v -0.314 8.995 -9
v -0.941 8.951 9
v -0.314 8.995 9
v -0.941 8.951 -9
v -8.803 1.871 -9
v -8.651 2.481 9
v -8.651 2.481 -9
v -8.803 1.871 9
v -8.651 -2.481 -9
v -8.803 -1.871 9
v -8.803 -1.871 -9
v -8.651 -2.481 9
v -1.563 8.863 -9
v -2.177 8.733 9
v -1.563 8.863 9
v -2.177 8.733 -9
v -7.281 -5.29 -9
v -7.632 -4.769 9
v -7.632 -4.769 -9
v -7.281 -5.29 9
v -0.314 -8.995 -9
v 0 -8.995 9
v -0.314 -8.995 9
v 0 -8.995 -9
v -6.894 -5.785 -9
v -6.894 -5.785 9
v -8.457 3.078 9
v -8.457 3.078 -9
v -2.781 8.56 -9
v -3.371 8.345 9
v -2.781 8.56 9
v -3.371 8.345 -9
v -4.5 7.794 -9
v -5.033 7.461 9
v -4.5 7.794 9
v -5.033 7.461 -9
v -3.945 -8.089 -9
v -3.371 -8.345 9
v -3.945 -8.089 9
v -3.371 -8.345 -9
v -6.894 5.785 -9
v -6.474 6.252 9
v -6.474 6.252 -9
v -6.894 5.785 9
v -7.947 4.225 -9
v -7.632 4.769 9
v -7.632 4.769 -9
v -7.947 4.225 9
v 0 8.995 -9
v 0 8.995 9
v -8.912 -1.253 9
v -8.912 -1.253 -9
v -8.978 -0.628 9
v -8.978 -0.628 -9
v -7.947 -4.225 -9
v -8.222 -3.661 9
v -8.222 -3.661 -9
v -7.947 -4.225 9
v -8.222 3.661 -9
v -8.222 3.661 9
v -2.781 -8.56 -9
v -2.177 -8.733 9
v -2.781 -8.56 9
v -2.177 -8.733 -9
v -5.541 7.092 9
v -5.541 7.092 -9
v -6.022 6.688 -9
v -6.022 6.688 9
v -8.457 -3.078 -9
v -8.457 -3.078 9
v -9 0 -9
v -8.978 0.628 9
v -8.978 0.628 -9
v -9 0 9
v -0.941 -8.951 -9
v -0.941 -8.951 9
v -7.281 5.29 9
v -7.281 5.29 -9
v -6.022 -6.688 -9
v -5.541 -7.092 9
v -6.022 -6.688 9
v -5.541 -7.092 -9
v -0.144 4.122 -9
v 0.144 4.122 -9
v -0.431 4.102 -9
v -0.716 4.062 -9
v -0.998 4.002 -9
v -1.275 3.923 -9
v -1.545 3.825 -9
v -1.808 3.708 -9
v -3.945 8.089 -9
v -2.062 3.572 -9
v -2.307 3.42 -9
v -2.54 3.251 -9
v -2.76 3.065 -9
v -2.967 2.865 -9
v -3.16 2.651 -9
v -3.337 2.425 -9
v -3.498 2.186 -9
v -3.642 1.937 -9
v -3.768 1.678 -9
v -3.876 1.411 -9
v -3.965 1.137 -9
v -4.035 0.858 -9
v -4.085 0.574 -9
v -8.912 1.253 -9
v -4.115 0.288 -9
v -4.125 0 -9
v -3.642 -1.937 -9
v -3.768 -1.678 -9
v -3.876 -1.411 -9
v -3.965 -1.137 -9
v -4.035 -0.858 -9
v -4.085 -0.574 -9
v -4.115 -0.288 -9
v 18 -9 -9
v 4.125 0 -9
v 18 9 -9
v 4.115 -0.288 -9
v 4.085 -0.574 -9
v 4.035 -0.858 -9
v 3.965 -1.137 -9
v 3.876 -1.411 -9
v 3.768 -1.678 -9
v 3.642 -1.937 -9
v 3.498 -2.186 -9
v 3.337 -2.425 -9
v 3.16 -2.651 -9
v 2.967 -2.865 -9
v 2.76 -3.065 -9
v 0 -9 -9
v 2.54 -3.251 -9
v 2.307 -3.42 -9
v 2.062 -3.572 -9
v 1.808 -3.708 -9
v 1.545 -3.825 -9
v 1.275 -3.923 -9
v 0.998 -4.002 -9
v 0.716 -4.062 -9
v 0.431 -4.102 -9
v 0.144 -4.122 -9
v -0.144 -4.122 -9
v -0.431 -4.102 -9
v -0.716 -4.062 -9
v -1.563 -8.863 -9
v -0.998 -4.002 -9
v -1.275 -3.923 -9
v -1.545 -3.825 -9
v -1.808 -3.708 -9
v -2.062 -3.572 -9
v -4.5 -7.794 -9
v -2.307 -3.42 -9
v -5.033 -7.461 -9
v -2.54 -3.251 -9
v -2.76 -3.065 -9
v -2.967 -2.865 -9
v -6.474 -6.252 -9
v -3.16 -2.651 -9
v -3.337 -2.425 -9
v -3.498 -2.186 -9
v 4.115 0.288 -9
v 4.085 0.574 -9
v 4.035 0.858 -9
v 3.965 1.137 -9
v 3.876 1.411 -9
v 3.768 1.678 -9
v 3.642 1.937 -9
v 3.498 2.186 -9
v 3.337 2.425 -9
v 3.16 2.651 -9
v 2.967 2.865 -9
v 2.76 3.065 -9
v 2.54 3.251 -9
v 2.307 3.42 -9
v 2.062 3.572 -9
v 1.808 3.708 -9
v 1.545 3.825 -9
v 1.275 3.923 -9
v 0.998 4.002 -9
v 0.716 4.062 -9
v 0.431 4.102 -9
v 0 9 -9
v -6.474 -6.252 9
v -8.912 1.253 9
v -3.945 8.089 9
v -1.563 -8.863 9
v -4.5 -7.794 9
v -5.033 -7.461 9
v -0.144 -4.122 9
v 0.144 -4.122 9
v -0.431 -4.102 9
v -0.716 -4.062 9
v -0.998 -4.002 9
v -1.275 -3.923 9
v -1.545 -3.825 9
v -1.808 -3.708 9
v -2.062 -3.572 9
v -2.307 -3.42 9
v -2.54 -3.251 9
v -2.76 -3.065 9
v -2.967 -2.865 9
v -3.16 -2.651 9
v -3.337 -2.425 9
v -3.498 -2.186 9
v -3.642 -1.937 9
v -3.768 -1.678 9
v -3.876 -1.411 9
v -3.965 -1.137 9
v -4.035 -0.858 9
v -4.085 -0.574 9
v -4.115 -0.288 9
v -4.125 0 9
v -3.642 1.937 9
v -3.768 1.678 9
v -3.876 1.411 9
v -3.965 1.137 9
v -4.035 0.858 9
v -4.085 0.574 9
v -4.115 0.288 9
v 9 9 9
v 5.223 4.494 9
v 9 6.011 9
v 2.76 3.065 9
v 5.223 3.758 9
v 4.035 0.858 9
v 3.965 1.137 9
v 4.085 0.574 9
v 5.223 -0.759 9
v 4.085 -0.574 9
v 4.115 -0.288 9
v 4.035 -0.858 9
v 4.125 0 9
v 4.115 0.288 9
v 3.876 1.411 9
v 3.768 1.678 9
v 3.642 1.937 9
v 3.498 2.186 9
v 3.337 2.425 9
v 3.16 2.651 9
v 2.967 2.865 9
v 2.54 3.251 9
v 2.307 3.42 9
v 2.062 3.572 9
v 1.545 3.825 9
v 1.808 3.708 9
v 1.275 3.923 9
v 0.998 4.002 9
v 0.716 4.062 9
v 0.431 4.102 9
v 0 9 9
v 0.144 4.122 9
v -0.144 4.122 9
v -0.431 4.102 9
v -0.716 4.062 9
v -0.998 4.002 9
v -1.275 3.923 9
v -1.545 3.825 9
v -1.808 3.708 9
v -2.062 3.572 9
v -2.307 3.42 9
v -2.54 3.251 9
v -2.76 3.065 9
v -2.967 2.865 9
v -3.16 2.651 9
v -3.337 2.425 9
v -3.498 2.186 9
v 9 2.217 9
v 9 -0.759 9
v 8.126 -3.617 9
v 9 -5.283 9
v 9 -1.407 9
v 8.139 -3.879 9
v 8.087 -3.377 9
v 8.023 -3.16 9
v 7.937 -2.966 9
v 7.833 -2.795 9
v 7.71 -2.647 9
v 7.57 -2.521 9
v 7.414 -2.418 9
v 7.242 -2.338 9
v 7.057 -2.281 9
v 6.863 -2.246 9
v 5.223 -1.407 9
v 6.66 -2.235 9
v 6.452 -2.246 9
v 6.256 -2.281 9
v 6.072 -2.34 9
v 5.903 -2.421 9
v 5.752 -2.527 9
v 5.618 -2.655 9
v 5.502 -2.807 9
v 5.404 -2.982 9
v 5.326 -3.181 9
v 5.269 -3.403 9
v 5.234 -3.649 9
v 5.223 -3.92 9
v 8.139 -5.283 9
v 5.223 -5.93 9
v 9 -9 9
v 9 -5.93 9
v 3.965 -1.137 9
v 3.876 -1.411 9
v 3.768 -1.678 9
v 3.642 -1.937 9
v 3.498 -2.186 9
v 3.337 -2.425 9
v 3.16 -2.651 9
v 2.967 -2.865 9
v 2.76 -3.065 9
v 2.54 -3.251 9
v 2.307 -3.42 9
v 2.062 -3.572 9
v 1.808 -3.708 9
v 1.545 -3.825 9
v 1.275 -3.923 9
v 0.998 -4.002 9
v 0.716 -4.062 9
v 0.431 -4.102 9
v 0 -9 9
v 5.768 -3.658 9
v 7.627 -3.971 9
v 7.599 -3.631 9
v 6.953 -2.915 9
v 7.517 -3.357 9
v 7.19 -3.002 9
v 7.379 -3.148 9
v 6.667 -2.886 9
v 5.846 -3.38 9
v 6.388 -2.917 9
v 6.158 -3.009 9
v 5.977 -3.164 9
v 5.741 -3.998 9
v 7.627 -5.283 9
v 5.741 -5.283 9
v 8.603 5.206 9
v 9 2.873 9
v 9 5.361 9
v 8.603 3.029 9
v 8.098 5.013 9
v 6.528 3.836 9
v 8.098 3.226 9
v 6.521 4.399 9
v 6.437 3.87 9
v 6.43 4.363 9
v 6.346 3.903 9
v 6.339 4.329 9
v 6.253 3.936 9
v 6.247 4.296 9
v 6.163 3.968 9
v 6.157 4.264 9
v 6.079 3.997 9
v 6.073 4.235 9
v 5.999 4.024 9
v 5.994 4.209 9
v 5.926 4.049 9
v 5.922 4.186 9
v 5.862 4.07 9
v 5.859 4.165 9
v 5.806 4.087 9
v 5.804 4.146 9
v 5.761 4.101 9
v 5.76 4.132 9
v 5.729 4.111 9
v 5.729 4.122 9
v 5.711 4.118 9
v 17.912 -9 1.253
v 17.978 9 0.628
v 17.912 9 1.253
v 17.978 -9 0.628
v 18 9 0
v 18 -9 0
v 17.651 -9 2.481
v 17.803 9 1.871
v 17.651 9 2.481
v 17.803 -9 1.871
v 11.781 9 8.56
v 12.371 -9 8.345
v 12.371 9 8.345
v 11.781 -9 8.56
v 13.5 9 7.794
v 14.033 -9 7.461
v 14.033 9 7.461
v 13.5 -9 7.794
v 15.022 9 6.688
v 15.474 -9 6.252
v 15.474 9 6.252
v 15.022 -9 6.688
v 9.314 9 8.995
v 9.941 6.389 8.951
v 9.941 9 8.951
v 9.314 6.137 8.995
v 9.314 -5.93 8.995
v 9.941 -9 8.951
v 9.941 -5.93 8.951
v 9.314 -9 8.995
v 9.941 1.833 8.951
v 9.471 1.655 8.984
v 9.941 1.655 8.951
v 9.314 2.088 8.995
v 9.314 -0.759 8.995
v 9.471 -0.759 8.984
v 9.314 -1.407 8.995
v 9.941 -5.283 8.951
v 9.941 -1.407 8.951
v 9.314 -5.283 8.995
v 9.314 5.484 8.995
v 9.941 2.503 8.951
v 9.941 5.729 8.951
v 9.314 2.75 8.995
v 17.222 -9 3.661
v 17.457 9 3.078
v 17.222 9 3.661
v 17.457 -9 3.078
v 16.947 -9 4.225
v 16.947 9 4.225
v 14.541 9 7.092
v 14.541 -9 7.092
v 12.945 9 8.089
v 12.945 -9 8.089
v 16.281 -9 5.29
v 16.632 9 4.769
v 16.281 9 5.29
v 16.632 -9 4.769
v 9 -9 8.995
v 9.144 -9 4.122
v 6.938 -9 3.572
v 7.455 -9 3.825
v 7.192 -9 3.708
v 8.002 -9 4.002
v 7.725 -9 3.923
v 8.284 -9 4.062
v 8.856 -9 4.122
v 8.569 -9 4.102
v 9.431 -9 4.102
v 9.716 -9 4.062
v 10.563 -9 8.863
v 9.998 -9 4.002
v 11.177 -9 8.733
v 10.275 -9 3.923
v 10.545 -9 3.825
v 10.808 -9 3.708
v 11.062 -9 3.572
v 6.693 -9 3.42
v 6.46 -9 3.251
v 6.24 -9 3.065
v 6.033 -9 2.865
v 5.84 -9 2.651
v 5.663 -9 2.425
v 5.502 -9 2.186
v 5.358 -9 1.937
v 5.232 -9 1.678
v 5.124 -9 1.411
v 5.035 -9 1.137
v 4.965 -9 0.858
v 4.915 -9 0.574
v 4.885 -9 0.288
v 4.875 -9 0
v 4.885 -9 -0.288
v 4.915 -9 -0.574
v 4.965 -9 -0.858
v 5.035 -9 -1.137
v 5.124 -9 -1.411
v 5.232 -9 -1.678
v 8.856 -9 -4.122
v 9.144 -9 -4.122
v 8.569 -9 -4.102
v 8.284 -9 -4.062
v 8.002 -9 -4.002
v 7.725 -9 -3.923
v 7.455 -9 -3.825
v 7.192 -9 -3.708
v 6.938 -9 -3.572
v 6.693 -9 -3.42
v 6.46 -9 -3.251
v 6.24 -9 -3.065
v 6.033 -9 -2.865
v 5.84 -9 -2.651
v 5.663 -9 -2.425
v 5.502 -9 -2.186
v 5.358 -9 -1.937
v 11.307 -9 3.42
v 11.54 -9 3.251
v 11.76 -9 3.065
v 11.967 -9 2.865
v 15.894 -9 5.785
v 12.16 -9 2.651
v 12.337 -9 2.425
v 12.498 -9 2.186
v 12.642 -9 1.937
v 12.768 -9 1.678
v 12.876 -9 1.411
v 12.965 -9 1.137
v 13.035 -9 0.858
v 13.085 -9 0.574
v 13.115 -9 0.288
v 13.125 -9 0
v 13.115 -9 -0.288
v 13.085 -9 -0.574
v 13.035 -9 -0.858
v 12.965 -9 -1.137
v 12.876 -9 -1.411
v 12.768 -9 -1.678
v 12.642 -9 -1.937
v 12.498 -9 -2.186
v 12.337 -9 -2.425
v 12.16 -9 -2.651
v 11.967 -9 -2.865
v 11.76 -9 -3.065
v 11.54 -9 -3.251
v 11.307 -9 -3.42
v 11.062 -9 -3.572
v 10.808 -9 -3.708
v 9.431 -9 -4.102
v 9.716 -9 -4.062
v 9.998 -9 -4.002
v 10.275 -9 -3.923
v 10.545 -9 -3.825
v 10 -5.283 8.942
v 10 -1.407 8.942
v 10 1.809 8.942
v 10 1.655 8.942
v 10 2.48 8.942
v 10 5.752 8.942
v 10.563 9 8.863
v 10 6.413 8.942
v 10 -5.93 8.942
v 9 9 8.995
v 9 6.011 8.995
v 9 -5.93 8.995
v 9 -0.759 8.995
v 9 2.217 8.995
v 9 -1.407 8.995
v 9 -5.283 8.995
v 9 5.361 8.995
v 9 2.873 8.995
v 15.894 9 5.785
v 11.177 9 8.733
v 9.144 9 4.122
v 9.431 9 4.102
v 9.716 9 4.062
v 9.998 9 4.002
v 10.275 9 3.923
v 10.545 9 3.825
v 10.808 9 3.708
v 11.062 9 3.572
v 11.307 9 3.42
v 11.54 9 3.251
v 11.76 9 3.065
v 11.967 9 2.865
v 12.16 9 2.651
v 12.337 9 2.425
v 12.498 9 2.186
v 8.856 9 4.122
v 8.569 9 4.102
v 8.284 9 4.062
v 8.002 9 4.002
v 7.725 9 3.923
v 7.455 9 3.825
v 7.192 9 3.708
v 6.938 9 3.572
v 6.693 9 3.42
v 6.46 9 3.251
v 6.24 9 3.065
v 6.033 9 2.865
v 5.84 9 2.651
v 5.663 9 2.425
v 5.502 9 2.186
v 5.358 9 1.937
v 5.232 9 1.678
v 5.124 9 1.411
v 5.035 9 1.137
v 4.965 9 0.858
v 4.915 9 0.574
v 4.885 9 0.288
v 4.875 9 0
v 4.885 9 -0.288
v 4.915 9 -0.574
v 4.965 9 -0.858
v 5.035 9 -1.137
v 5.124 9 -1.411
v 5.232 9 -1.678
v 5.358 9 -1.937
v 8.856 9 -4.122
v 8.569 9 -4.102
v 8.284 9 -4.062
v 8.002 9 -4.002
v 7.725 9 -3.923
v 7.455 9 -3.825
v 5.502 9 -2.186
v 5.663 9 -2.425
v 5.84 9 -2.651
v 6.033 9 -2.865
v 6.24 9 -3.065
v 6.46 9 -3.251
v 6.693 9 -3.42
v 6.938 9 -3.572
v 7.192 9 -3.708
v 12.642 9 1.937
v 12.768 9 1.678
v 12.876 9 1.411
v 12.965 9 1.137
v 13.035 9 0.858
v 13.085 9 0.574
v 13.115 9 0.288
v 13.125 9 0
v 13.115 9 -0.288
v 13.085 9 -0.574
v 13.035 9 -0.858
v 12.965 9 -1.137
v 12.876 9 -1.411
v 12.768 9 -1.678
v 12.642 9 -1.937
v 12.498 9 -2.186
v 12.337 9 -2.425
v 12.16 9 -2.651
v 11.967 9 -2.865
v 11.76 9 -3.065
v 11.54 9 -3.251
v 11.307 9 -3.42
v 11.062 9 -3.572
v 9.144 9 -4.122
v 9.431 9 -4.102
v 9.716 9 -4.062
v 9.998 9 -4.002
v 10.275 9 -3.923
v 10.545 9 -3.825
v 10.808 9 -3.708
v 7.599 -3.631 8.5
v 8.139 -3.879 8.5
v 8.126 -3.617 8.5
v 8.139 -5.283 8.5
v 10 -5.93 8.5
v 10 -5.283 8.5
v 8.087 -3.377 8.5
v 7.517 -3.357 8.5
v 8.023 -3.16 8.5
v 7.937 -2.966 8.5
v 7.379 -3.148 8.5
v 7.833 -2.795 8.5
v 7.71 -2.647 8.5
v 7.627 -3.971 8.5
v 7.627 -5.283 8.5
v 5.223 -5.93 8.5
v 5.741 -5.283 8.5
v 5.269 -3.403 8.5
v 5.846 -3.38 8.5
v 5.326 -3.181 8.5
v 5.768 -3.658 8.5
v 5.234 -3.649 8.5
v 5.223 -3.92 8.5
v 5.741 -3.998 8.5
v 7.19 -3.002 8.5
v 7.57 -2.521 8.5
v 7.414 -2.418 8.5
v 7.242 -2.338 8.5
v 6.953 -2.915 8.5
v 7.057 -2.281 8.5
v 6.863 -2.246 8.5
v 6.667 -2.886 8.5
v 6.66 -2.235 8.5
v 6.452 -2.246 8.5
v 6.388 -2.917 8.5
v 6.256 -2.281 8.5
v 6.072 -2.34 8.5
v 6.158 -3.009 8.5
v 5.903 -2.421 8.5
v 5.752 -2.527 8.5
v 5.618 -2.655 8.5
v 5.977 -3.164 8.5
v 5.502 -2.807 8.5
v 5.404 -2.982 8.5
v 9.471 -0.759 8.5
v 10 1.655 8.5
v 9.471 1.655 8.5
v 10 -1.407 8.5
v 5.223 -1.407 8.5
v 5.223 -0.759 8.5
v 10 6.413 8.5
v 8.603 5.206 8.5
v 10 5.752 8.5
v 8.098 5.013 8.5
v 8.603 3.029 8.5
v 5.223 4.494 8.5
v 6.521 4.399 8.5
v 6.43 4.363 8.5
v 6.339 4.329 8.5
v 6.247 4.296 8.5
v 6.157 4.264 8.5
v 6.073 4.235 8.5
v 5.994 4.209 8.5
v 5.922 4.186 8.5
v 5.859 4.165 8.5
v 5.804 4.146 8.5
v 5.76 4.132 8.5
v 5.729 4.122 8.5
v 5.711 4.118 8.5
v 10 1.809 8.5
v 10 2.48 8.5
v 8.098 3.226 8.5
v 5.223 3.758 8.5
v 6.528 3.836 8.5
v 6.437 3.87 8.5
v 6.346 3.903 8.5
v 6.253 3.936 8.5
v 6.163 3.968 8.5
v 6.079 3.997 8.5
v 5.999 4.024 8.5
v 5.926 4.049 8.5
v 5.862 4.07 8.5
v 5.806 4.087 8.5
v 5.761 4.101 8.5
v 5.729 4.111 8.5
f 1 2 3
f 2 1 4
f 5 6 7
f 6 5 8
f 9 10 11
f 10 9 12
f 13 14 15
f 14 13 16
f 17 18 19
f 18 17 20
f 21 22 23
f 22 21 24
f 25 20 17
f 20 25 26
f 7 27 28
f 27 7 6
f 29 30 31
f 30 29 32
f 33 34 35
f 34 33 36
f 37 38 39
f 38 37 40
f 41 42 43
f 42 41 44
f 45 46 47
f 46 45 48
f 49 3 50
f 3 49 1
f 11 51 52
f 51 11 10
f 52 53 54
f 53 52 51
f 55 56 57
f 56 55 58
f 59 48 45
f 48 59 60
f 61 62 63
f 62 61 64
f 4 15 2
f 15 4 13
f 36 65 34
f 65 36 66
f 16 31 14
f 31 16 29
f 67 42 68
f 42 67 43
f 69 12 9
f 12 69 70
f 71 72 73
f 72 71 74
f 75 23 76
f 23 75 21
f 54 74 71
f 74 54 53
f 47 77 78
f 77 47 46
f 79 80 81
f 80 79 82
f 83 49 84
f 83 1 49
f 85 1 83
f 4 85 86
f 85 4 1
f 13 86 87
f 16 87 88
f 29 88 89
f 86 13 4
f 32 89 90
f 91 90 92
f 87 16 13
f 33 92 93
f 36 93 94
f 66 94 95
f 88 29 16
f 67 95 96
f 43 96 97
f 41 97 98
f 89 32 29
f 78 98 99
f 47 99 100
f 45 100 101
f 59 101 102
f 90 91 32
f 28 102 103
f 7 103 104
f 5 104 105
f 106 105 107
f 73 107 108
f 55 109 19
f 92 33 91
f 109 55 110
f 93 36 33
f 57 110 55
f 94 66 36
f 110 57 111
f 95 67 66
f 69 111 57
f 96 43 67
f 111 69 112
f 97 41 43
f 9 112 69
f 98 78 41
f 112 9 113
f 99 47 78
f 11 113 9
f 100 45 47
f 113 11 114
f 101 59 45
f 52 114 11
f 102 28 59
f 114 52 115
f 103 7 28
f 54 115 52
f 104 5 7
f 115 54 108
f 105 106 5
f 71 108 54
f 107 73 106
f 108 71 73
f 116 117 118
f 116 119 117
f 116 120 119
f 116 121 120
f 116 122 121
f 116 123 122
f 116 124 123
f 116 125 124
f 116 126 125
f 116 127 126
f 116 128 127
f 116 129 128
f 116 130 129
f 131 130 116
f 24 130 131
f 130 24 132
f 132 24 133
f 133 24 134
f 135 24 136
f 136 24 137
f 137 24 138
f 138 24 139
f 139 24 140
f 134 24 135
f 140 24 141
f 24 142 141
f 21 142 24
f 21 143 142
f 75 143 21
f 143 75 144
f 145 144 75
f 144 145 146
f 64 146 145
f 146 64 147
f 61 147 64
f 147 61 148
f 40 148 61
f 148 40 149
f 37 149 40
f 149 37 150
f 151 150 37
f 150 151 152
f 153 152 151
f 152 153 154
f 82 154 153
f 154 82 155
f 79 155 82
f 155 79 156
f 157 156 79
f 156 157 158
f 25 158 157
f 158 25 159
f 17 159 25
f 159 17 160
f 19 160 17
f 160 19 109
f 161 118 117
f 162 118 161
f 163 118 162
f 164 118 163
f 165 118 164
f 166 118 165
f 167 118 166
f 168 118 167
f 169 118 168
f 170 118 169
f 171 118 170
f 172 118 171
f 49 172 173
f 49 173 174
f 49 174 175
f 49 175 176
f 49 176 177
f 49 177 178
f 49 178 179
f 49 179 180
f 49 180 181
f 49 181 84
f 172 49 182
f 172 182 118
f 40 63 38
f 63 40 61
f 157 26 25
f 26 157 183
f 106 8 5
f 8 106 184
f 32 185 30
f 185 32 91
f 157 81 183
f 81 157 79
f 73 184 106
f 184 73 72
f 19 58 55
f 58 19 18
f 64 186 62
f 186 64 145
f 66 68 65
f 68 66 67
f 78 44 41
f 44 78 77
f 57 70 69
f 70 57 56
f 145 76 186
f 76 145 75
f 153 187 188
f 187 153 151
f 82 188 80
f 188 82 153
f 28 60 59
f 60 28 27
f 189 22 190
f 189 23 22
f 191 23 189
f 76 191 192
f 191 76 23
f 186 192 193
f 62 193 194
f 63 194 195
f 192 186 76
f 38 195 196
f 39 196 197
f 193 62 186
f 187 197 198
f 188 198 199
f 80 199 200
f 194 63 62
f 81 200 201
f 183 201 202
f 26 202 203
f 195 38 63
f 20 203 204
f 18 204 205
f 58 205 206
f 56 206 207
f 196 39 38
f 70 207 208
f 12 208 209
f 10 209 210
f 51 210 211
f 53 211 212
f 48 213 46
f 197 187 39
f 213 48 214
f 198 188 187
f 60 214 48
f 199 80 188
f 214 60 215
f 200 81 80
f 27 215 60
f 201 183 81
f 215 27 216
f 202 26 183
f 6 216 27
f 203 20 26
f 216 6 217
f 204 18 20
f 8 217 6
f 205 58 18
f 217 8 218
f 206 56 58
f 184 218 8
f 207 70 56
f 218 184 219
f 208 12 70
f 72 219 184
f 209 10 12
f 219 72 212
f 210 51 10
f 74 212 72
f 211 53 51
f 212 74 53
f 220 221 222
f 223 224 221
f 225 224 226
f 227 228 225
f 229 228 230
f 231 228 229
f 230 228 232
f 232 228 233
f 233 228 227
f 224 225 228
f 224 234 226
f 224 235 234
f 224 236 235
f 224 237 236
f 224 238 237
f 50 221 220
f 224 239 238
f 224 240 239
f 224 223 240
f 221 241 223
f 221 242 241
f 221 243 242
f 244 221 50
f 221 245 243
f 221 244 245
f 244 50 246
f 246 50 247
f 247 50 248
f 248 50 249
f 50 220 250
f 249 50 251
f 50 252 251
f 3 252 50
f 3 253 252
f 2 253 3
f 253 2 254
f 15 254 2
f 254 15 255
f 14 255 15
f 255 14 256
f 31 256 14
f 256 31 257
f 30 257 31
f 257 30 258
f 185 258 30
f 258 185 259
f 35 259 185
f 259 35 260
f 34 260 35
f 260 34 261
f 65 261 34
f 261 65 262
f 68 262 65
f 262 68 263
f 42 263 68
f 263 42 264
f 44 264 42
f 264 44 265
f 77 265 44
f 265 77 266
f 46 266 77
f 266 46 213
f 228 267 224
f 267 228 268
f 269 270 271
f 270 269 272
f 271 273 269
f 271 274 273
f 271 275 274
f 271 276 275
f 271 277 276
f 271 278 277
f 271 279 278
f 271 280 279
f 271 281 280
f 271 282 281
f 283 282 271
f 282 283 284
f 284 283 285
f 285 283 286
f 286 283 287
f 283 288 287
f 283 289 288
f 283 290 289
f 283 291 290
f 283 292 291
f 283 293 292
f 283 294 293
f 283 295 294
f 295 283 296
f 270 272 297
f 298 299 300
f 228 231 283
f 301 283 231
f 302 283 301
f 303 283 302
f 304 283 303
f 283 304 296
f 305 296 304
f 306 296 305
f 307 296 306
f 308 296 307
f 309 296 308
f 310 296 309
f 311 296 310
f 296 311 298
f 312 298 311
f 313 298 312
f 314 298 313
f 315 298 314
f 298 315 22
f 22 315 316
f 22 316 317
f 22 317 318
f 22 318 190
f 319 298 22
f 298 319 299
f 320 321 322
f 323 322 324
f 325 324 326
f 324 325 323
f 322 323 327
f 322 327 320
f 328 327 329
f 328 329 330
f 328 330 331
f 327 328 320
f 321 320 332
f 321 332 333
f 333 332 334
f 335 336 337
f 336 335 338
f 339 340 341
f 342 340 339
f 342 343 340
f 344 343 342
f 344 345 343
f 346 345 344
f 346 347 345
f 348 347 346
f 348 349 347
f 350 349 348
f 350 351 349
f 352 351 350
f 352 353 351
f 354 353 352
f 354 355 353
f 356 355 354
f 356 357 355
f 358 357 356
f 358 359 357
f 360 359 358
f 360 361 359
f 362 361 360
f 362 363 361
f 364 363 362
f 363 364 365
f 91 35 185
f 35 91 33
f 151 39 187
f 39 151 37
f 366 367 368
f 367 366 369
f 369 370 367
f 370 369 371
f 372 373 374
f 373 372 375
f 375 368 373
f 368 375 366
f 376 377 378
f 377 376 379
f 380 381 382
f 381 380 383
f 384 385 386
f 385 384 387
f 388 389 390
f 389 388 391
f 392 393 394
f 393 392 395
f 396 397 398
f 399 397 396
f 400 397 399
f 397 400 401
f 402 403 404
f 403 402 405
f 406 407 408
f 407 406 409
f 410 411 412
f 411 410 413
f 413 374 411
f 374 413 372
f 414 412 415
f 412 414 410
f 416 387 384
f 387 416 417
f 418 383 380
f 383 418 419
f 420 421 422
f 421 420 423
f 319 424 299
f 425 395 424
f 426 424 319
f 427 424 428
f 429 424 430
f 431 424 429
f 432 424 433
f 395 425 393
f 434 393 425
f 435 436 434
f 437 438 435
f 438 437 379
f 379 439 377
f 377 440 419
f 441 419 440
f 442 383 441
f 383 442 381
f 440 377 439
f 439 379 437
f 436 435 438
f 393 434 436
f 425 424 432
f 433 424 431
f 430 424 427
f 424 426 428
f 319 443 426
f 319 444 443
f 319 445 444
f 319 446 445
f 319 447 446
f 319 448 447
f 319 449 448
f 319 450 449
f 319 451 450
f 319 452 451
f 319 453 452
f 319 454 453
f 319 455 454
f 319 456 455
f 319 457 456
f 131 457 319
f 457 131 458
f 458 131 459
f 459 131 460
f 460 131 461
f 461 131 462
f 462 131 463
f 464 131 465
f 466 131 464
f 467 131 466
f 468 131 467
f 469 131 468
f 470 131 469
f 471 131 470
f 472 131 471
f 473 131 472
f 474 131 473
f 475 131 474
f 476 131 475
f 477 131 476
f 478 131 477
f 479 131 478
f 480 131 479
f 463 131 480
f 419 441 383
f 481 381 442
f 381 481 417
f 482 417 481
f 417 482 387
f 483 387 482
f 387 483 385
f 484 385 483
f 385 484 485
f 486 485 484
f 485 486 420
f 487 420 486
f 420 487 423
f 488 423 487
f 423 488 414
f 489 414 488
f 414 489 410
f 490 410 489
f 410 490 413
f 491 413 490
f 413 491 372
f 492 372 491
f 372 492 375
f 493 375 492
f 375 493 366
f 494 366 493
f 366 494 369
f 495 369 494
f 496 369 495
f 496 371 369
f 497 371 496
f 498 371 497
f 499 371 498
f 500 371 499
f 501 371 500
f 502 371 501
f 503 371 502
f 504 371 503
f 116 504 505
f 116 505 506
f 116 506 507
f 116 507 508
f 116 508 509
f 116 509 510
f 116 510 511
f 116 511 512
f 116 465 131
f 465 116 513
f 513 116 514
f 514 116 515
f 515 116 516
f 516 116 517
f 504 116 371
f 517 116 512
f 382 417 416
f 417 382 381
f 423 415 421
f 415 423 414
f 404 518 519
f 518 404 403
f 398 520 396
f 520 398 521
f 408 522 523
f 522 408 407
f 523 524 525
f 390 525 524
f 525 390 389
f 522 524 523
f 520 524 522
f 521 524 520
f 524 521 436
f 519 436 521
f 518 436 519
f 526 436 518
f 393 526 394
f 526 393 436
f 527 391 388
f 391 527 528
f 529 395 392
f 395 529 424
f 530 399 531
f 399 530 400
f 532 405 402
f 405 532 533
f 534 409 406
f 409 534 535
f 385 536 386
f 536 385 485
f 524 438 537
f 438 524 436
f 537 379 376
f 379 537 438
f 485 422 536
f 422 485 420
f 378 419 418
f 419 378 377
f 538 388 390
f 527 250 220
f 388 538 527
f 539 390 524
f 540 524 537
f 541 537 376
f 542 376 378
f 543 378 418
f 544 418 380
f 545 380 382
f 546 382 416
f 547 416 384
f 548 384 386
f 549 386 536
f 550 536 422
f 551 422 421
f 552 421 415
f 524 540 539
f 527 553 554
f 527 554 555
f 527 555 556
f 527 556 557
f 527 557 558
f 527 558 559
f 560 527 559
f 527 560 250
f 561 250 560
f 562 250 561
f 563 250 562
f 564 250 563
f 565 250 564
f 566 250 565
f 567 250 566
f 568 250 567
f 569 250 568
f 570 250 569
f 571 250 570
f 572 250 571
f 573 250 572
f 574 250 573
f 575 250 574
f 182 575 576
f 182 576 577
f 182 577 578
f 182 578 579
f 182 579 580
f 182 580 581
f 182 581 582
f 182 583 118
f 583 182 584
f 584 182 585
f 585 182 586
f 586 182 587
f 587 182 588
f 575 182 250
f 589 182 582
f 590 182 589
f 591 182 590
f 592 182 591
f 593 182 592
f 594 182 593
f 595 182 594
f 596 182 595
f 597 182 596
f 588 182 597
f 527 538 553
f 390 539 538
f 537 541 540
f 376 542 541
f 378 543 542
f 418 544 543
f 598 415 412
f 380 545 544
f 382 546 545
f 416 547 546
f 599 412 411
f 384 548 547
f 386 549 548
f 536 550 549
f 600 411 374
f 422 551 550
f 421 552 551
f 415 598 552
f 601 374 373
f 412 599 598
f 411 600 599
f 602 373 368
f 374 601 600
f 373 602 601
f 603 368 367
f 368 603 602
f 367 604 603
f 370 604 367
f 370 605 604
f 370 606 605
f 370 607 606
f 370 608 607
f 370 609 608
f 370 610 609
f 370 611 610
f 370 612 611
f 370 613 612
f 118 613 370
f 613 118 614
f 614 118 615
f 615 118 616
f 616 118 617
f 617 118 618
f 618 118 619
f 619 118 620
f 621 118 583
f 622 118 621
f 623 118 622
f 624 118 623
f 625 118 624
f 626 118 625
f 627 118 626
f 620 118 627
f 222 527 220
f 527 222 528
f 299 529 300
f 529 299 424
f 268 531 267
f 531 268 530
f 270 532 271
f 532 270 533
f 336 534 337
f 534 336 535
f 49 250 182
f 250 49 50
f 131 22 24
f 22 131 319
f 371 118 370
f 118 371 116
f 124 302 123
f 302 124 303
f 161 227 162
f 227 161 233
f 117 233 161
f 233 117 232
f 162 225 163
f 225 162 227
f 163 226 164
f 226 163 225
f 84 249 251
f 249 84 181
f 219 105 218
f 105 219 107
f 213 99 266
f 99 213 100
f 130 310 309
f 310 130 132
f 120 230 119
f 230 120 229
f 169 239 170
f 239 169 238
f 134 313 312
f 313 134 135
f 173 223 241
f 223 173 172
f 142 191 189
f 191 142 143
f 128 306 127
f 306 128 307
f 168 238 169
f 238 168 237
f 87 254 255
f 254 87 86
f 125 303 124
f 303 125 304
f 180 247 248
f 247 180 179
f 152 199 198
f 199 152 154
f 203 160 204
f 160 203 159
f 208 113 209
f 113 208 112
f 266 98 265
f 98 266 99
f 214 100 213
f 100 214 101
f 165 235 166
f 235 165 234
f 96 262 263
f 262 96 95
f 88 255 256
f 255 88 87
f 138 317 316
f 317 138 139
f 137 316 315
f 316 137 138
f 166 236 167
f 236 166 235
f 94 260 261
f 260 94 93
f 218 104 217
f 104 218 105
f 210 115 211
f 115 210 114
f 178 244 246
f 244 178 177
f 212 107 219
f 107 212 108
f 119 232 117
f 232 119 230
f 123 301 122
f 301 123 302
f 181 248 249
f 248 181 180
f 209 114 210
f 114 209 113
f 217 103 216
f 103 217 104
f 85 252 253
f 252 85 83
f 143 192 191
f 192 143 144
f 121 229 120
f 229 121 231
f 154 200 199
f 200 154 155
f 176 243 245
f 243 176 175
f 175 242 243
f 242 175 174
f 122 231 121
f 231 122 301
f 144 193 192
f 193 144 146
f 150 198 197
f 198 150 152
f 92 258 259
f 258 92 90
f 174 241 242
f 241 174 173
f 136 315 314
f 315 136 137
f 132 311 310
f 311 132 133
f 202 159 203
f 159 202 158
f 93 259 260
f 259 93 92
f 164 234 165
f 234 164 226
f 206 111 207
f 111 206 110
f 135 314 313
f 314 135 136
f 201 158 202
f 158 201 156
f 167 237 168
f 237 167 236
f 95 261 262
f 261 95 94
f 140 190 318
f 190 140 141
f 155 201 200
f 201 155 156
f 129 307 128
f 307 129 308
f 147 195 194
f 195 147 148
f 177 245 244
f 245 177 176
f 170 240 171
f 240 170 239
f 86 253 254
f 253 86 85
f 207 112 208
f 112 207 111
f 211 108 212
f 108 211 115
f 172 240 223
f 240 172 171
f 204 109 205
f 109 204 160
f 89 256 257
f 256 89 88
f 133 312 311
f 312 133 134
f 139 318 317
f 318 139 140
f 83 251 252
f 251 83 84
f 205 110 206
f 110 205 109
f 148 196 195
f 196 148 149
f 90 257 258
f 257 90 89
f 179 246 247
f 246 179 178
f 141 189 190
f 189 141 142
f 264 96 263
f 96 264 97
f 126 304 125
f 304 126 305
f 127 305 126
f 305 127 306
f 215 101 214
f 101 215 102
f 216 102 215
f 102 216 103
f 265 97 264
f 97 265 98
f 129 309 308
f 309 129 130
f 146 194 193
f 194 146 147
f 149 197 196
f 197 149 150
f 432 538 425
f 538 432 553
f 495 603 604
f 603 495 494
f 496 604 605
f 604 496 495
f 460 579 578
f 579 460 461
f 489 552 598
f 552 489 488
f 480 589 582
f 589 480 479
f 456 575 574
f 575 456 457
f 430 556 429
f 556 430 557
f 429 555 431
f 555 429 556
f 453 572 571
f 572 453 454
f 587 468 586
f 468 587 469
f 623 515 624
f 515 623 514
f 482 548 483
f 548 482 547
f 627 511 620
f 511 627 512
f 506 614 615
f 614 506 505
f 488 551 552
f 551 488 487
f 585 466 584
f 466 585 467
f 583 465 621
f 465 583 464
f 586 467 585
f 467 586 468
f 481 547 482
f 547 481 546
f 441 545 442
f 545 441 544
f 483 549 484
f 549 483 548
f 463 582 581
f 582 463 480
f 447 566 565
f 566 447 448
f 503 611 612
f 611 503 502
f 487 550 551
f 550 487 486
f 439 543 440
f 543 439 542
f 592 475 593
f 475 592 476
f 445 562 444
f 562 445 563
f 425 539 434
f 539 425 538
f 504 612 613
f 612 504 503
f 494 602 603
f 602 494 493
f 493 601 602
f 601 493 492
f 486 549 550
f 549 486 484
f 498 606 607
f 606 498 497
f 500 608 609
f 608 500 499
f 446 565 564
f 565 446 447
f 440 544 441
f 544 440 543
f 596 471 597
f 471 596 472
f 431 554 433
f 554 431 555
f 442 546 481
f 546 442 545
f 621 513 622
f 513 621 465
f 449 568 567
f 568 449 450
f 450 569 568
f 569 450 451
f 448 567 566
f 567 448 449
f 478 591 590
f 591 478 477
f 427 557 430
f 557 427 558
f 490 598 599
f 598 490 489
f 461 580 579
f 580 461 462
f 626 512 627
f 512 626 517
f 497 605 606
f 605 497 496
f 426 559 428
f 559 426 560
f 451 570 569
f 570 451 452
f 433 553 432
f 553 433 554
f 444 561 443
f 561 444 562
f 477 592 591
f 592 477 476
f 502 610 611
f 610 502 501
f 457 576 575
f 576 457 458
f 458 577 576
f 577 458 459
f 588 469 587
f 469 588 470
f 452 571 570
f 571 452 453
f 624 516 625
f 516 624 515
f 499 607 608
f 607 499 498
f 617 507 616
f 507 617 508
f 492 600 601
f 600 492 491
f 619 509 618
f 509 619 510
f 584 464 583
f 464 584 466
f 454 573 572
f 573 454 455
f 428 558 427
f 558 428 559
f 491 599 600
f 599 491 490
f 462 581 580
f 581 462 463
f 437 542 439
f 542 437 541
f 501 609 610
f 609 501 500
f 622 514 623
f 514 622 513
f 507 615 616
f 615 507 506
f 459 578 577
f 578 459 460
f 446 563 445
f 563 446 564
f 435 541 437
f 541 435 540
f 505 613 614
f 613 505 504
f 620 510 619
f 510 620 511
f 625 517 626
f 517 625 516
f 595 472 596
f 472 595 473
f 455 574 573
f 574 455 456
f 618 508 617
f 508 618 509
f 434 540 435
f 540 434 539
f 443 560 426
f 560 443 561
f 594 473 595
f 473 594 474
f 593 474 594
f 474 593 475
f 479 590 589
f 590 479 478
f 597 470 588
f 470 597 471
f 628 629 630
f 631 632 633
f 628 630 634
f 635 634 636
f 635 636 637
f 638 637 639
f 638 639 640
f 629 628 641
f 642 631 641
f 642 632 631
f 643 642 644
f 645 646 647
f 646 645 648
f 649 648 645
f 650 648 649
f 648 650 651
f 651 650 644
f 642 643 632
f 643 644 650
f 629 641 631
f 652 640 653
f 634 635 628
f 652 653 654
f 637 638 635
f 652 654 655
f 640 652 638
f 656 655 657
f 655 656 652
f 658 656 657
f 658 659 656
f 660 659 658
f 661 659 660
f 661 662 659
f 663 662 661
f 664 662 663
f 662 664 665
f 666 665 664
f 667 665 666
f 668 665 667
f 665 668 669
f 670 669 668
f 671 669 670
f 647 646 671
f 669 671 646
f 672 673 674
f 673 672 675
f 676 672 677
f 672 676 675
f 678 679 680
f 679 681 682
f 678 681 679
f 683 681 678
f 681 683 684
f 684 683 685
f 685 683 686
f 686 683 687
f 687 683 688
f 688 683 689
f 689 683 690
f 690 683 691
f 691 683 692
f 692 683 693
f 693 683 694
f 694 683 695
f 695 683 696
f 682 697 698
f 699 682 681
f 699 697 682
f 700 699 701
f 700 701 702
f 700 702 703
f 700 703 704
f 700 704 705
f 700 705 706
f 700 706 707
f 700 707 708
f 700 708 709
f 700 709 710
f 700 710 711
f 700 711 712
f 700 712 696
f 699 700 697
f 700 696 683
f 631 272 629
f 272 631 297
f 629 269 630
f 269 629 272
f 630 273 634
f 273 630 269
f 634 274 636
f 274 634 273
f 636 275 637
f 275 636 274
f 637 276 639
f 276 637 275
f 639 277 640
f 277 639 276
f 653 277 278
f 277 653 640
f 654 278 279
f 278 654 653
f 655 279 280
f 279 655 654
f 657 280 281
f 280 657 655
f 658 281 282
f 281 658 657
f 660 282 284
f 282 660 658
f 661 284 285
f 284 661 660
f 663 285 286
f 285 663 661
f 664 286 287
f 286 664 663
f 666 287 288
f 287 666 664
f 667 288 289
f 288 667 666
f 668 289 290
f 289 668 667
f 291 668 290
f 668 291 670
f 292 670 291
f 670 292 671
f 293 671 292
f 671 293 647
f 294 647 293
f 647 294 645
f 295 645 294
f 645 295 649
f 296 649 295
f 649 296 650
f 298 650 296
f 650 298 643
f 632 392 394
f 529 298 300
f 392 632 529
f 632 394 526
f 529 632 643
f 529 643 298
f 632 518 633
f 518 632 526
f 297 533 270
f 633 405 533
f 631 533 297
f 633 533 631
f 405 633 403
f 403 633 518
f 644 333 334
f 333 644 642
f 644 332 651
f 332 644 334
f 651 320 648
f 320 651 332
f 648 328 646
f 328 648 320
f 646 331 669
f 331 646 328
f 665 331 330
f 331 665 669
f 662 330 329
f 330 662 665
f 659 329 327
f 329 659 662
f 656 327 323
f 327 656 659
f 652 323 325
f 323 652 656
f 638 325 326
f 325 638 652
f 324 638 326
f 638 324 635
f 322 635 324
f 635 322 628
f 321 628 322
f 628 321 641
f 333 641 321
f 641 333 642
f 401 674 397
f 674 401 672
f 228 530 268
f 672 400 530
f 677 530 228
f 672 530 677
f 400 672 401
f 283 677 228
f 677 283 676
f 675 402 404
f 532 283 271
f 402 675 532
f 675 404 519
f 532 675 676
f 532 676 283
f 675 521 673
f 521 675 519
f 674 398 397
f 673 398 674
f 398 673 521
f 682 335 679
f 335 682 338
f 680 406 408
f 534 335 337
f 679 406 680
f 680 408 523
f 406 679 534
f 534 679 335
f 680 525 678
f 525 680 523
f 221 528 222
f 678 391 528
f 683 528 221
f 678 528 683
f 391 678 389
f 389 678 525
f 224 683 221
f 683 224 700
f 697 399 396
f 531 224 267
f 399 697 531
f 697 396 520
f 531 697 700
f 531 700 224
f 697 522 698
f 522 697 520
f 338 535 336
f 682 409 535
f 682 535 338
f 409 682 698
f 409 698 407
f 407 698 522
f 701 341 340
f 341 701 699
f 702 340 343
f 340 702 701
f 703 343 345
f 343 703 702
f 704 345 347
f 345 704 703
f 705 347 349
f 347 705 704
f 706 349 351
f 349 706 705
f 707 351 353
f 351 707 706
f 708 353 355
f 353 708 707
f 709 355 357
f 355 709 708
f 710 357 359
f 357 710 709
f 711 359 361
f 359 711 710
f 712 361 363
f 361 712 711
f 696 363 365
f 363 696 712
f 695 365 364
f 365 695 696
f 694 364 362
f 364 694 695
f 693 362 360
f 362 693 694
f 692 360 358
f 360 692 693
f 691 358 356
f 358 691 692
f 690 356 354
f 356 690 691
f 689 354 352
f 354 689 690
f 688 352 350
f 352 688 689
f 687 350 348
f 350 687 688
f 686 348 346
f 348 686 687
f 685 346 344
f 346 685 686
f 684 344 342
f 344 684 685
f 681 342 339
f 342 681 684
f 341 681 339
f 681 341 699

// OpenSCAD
//cube([120,120,3], center = true);
//translate([-45,-45,0])cylinder(h = 3, r=15, $fn = 180, center = true);
//rotate_extrude(convexity = 10, $fn = A) translate([20+1.5, 0, 0])circle(d = 3, $fn = B);
//module Test(){
//import("asd.stl");

//sphere(2, $fn=100); 

//linear_extrude(height = 10)text("asd",10);


/*
linear_extrude(height=100,twist=360,$fn=360) 
translate([45,0,0])
rotate([0,0,9])
square([5,15]);

rotate_extrude(angle = 270, $fn=30)
translate([10,0,0])square([10,5]);
*/

/*

CubePoints = [
  [  0,  0,  0 ],  //0
  [ 10,  0,  0 ],  //1
  [ 10,  7,  0 ],  //2
  [  0,  7,  0 ],  //3
  [  0,  0,  5 ],  //4
  [ 10,  0,  5 ],  //5
  [ 10,  7,  5 ],  //6
  [  0,  7,  5 ]]; //7
  
CubeFaces = [
  [0,1,2,3],  // bottom
  [4,5,1,0],  // front
  [7,6,5,4],  // top
  [5,6,2,1],  // right
  [6,7,3,2],  // back
  [7,4,0,3]]; // left
  
polyhedron( CubePoints, CubeFaces );
     
*/     

difference(){
union(){   
cylinder(h = 18, d=18, $fn = 90, center = true);

translate([9,0,0])rotate([90,0,0])cylinder(h = 18, d=18, $fn = 90, center = true);
    
translate([4.5,0,0])cube([9,18,18], center = true);   
   
   
translate([9,0,-4.5])cube([18,18,9], center = true);    
    
    
}
cylinder(h = 19, d=8.25, $fn = 90, center = true);

translate([9,0,0])rotate([90,0,0])cylinder(h = 19, d=8.25, $fn = 90, center = true);

translate([10,-6.5,8.5])rotate([0,0,90])linear_extrude(height = 0.5)text("PLA",5);
}


    
